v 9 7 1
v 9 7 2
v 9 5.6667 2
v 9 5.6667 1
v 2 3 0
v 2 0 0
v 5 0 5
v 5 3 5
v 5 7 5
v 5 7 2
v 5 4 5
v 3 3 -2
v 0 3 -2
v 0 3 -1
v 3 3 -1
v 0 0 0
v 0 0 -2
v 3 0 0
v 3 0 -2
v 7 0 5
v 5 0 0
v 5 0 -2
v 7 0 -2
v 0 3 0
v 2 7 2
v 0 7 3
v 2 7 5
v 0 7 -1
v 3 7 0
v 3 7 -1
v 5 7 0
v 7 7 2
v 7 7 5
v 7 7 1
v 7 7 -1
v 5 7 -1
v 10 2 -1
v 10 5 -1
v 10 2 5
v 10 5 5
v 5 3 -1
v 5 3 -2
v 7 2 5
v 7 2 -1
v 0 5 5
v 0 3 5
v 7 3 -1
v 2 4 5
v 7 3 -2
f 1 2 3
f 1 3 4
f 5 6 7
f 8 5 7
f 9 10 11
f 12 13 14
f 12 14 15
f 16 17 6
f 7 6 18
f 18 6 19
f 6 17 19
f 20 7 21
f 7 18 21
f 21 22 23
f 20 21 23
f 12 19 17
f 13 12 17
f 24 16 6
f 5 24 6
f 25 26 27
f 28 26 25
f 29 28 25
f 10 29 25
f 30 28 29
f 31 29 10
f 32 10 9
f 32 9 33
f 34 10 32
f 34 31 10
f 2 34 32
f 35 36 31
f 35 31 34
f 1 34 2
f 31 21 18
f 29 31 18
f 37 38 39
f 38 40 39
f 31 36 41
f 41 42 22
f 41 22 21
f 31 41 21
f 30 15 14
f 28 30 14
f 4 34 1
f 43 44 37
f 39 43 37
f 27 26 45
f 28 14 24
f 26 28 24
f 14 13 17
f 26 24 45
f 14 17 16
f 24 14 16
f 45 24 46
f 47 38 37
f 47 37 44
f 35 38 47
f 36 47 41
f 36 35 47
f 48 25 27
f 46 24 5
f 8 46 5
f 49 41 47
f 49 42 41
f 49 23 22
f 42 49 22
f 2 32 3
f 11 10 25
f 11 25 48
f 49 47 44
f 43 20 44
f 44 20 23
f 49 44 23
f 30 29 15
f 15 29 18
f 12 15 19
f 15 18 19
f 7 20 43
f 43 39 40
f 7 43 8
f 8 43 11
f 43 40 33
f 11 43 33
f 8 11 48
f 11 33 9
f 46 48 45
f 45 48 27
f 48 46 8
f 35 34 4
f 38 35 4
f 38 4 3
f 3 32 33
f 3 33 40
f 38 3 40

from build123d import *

# Parameters (mm, degrees)
BOSS_EXTRUDE1_DEPTH      = 3
BOSS_EXTRUDE2_DEPTH      = 4
CUT_EXTRUDE4_DEPTH       = 3
CUT_EXTRUDE5_DEPTH       = 3
BOSS_EXTRUDE3_DEPTH      = 5
BOSS_EXTRUDE3_DEPTH_BACK = 1
SKETCH7_W                = 2
SKETCH7_H                = 1
BOSS_EXTRUDE4_DEPTH      = 5


with BuildPart() as part:
    # Sketch2 → Boss-Extrude1 (new body)
    with BuildSketch(Plane(origin=(0, 0, 0), x_dir=(1, 0, 0), z_dir=(0, 1, 0))):
        Polygon((0, 0), (2, 0), (5, -5), (7, -5), (7, 2), (5, 2), (5, 0), (3, 0), (3, 2), (0, 2), align=None)
    extrude(amount=BOSS_EXTRUDE1_DEPTH)

    # Sketch3 → Boss-Extrude2 (add)
    with BuildSketch(Plane(origin=(0, 3, 0), x_dir=(1, 0, 0), z_dir=(0, 1, 0))):
        Polygon((3, 0), (3, 1), (0, 1), (0, 0), (2, 0), (5, -5), (7, -5), (7, 1), (5, 1), (5, 0), align=None)
        Polygon((2, 0), (0, 0), (0, -5), (5, -5), align=None)
    extrude(amount=BOSS_EXTRUDE2_DEPTH)

    # Sketch5 → Cut-Extrude4 (cut)
    with BuildSketch(Plane.ZY.offset(-5)):
        Polygon((5, 4), (5, 7), (2, 7), align=None)
    extrude(amount=CUT_EXTRUDE4_DEPTH, mode=Mode.SUBTRACT)

    # 3DSketch1 → Cut-Extrude5 (cut, along a direction that is not the sketch's normal)
    with BuildSketch(Plane(origin=(0, 5, 5), x_dir=(0, 0.7071067811865476, -0.7071067811865476), z_dir=(0.5773502691896267, -0.5773502691896254, -0.5773502691896254))):
        Polygon((0, 0), (1.414213562, 2.449489743), (2.828427125, 0), align=None)
    extrude(amount=-CUT_EXTRUDE5_DEPTH, dir=(1, 0, 0), mode=Mode.SUBTRACT)

    # Sketch6 → Boss-Extrude3 (add, two sides)
    with BuildSketch(Plane.XY) as boss_extrude3_sk:
        Polygon((7, 7), (10, 5), (10, 2), (7, 2), align=None)
    extrude(amount=BOSS_EXTRUDE3_DEPTH)
    extrude(boss_extrude3_sk.sketch, amount=-BOSS_EXTRUDE3_DEPTH_BACK)

    # Sketch7 → Boss-Extrude4 (add)
    with BuildSketch(Plane(origin=(0, 7, 0), x_dir=(1, 0, 0), z_dir=(0, 1, 0))):
        with Locations((8, -1.5)):
            Rectangle(SKETCH7_W, SKETCH7_H)
    extrude(amount=-BOSS_EXTRUDE4_DEPTH)


solid = part.part
